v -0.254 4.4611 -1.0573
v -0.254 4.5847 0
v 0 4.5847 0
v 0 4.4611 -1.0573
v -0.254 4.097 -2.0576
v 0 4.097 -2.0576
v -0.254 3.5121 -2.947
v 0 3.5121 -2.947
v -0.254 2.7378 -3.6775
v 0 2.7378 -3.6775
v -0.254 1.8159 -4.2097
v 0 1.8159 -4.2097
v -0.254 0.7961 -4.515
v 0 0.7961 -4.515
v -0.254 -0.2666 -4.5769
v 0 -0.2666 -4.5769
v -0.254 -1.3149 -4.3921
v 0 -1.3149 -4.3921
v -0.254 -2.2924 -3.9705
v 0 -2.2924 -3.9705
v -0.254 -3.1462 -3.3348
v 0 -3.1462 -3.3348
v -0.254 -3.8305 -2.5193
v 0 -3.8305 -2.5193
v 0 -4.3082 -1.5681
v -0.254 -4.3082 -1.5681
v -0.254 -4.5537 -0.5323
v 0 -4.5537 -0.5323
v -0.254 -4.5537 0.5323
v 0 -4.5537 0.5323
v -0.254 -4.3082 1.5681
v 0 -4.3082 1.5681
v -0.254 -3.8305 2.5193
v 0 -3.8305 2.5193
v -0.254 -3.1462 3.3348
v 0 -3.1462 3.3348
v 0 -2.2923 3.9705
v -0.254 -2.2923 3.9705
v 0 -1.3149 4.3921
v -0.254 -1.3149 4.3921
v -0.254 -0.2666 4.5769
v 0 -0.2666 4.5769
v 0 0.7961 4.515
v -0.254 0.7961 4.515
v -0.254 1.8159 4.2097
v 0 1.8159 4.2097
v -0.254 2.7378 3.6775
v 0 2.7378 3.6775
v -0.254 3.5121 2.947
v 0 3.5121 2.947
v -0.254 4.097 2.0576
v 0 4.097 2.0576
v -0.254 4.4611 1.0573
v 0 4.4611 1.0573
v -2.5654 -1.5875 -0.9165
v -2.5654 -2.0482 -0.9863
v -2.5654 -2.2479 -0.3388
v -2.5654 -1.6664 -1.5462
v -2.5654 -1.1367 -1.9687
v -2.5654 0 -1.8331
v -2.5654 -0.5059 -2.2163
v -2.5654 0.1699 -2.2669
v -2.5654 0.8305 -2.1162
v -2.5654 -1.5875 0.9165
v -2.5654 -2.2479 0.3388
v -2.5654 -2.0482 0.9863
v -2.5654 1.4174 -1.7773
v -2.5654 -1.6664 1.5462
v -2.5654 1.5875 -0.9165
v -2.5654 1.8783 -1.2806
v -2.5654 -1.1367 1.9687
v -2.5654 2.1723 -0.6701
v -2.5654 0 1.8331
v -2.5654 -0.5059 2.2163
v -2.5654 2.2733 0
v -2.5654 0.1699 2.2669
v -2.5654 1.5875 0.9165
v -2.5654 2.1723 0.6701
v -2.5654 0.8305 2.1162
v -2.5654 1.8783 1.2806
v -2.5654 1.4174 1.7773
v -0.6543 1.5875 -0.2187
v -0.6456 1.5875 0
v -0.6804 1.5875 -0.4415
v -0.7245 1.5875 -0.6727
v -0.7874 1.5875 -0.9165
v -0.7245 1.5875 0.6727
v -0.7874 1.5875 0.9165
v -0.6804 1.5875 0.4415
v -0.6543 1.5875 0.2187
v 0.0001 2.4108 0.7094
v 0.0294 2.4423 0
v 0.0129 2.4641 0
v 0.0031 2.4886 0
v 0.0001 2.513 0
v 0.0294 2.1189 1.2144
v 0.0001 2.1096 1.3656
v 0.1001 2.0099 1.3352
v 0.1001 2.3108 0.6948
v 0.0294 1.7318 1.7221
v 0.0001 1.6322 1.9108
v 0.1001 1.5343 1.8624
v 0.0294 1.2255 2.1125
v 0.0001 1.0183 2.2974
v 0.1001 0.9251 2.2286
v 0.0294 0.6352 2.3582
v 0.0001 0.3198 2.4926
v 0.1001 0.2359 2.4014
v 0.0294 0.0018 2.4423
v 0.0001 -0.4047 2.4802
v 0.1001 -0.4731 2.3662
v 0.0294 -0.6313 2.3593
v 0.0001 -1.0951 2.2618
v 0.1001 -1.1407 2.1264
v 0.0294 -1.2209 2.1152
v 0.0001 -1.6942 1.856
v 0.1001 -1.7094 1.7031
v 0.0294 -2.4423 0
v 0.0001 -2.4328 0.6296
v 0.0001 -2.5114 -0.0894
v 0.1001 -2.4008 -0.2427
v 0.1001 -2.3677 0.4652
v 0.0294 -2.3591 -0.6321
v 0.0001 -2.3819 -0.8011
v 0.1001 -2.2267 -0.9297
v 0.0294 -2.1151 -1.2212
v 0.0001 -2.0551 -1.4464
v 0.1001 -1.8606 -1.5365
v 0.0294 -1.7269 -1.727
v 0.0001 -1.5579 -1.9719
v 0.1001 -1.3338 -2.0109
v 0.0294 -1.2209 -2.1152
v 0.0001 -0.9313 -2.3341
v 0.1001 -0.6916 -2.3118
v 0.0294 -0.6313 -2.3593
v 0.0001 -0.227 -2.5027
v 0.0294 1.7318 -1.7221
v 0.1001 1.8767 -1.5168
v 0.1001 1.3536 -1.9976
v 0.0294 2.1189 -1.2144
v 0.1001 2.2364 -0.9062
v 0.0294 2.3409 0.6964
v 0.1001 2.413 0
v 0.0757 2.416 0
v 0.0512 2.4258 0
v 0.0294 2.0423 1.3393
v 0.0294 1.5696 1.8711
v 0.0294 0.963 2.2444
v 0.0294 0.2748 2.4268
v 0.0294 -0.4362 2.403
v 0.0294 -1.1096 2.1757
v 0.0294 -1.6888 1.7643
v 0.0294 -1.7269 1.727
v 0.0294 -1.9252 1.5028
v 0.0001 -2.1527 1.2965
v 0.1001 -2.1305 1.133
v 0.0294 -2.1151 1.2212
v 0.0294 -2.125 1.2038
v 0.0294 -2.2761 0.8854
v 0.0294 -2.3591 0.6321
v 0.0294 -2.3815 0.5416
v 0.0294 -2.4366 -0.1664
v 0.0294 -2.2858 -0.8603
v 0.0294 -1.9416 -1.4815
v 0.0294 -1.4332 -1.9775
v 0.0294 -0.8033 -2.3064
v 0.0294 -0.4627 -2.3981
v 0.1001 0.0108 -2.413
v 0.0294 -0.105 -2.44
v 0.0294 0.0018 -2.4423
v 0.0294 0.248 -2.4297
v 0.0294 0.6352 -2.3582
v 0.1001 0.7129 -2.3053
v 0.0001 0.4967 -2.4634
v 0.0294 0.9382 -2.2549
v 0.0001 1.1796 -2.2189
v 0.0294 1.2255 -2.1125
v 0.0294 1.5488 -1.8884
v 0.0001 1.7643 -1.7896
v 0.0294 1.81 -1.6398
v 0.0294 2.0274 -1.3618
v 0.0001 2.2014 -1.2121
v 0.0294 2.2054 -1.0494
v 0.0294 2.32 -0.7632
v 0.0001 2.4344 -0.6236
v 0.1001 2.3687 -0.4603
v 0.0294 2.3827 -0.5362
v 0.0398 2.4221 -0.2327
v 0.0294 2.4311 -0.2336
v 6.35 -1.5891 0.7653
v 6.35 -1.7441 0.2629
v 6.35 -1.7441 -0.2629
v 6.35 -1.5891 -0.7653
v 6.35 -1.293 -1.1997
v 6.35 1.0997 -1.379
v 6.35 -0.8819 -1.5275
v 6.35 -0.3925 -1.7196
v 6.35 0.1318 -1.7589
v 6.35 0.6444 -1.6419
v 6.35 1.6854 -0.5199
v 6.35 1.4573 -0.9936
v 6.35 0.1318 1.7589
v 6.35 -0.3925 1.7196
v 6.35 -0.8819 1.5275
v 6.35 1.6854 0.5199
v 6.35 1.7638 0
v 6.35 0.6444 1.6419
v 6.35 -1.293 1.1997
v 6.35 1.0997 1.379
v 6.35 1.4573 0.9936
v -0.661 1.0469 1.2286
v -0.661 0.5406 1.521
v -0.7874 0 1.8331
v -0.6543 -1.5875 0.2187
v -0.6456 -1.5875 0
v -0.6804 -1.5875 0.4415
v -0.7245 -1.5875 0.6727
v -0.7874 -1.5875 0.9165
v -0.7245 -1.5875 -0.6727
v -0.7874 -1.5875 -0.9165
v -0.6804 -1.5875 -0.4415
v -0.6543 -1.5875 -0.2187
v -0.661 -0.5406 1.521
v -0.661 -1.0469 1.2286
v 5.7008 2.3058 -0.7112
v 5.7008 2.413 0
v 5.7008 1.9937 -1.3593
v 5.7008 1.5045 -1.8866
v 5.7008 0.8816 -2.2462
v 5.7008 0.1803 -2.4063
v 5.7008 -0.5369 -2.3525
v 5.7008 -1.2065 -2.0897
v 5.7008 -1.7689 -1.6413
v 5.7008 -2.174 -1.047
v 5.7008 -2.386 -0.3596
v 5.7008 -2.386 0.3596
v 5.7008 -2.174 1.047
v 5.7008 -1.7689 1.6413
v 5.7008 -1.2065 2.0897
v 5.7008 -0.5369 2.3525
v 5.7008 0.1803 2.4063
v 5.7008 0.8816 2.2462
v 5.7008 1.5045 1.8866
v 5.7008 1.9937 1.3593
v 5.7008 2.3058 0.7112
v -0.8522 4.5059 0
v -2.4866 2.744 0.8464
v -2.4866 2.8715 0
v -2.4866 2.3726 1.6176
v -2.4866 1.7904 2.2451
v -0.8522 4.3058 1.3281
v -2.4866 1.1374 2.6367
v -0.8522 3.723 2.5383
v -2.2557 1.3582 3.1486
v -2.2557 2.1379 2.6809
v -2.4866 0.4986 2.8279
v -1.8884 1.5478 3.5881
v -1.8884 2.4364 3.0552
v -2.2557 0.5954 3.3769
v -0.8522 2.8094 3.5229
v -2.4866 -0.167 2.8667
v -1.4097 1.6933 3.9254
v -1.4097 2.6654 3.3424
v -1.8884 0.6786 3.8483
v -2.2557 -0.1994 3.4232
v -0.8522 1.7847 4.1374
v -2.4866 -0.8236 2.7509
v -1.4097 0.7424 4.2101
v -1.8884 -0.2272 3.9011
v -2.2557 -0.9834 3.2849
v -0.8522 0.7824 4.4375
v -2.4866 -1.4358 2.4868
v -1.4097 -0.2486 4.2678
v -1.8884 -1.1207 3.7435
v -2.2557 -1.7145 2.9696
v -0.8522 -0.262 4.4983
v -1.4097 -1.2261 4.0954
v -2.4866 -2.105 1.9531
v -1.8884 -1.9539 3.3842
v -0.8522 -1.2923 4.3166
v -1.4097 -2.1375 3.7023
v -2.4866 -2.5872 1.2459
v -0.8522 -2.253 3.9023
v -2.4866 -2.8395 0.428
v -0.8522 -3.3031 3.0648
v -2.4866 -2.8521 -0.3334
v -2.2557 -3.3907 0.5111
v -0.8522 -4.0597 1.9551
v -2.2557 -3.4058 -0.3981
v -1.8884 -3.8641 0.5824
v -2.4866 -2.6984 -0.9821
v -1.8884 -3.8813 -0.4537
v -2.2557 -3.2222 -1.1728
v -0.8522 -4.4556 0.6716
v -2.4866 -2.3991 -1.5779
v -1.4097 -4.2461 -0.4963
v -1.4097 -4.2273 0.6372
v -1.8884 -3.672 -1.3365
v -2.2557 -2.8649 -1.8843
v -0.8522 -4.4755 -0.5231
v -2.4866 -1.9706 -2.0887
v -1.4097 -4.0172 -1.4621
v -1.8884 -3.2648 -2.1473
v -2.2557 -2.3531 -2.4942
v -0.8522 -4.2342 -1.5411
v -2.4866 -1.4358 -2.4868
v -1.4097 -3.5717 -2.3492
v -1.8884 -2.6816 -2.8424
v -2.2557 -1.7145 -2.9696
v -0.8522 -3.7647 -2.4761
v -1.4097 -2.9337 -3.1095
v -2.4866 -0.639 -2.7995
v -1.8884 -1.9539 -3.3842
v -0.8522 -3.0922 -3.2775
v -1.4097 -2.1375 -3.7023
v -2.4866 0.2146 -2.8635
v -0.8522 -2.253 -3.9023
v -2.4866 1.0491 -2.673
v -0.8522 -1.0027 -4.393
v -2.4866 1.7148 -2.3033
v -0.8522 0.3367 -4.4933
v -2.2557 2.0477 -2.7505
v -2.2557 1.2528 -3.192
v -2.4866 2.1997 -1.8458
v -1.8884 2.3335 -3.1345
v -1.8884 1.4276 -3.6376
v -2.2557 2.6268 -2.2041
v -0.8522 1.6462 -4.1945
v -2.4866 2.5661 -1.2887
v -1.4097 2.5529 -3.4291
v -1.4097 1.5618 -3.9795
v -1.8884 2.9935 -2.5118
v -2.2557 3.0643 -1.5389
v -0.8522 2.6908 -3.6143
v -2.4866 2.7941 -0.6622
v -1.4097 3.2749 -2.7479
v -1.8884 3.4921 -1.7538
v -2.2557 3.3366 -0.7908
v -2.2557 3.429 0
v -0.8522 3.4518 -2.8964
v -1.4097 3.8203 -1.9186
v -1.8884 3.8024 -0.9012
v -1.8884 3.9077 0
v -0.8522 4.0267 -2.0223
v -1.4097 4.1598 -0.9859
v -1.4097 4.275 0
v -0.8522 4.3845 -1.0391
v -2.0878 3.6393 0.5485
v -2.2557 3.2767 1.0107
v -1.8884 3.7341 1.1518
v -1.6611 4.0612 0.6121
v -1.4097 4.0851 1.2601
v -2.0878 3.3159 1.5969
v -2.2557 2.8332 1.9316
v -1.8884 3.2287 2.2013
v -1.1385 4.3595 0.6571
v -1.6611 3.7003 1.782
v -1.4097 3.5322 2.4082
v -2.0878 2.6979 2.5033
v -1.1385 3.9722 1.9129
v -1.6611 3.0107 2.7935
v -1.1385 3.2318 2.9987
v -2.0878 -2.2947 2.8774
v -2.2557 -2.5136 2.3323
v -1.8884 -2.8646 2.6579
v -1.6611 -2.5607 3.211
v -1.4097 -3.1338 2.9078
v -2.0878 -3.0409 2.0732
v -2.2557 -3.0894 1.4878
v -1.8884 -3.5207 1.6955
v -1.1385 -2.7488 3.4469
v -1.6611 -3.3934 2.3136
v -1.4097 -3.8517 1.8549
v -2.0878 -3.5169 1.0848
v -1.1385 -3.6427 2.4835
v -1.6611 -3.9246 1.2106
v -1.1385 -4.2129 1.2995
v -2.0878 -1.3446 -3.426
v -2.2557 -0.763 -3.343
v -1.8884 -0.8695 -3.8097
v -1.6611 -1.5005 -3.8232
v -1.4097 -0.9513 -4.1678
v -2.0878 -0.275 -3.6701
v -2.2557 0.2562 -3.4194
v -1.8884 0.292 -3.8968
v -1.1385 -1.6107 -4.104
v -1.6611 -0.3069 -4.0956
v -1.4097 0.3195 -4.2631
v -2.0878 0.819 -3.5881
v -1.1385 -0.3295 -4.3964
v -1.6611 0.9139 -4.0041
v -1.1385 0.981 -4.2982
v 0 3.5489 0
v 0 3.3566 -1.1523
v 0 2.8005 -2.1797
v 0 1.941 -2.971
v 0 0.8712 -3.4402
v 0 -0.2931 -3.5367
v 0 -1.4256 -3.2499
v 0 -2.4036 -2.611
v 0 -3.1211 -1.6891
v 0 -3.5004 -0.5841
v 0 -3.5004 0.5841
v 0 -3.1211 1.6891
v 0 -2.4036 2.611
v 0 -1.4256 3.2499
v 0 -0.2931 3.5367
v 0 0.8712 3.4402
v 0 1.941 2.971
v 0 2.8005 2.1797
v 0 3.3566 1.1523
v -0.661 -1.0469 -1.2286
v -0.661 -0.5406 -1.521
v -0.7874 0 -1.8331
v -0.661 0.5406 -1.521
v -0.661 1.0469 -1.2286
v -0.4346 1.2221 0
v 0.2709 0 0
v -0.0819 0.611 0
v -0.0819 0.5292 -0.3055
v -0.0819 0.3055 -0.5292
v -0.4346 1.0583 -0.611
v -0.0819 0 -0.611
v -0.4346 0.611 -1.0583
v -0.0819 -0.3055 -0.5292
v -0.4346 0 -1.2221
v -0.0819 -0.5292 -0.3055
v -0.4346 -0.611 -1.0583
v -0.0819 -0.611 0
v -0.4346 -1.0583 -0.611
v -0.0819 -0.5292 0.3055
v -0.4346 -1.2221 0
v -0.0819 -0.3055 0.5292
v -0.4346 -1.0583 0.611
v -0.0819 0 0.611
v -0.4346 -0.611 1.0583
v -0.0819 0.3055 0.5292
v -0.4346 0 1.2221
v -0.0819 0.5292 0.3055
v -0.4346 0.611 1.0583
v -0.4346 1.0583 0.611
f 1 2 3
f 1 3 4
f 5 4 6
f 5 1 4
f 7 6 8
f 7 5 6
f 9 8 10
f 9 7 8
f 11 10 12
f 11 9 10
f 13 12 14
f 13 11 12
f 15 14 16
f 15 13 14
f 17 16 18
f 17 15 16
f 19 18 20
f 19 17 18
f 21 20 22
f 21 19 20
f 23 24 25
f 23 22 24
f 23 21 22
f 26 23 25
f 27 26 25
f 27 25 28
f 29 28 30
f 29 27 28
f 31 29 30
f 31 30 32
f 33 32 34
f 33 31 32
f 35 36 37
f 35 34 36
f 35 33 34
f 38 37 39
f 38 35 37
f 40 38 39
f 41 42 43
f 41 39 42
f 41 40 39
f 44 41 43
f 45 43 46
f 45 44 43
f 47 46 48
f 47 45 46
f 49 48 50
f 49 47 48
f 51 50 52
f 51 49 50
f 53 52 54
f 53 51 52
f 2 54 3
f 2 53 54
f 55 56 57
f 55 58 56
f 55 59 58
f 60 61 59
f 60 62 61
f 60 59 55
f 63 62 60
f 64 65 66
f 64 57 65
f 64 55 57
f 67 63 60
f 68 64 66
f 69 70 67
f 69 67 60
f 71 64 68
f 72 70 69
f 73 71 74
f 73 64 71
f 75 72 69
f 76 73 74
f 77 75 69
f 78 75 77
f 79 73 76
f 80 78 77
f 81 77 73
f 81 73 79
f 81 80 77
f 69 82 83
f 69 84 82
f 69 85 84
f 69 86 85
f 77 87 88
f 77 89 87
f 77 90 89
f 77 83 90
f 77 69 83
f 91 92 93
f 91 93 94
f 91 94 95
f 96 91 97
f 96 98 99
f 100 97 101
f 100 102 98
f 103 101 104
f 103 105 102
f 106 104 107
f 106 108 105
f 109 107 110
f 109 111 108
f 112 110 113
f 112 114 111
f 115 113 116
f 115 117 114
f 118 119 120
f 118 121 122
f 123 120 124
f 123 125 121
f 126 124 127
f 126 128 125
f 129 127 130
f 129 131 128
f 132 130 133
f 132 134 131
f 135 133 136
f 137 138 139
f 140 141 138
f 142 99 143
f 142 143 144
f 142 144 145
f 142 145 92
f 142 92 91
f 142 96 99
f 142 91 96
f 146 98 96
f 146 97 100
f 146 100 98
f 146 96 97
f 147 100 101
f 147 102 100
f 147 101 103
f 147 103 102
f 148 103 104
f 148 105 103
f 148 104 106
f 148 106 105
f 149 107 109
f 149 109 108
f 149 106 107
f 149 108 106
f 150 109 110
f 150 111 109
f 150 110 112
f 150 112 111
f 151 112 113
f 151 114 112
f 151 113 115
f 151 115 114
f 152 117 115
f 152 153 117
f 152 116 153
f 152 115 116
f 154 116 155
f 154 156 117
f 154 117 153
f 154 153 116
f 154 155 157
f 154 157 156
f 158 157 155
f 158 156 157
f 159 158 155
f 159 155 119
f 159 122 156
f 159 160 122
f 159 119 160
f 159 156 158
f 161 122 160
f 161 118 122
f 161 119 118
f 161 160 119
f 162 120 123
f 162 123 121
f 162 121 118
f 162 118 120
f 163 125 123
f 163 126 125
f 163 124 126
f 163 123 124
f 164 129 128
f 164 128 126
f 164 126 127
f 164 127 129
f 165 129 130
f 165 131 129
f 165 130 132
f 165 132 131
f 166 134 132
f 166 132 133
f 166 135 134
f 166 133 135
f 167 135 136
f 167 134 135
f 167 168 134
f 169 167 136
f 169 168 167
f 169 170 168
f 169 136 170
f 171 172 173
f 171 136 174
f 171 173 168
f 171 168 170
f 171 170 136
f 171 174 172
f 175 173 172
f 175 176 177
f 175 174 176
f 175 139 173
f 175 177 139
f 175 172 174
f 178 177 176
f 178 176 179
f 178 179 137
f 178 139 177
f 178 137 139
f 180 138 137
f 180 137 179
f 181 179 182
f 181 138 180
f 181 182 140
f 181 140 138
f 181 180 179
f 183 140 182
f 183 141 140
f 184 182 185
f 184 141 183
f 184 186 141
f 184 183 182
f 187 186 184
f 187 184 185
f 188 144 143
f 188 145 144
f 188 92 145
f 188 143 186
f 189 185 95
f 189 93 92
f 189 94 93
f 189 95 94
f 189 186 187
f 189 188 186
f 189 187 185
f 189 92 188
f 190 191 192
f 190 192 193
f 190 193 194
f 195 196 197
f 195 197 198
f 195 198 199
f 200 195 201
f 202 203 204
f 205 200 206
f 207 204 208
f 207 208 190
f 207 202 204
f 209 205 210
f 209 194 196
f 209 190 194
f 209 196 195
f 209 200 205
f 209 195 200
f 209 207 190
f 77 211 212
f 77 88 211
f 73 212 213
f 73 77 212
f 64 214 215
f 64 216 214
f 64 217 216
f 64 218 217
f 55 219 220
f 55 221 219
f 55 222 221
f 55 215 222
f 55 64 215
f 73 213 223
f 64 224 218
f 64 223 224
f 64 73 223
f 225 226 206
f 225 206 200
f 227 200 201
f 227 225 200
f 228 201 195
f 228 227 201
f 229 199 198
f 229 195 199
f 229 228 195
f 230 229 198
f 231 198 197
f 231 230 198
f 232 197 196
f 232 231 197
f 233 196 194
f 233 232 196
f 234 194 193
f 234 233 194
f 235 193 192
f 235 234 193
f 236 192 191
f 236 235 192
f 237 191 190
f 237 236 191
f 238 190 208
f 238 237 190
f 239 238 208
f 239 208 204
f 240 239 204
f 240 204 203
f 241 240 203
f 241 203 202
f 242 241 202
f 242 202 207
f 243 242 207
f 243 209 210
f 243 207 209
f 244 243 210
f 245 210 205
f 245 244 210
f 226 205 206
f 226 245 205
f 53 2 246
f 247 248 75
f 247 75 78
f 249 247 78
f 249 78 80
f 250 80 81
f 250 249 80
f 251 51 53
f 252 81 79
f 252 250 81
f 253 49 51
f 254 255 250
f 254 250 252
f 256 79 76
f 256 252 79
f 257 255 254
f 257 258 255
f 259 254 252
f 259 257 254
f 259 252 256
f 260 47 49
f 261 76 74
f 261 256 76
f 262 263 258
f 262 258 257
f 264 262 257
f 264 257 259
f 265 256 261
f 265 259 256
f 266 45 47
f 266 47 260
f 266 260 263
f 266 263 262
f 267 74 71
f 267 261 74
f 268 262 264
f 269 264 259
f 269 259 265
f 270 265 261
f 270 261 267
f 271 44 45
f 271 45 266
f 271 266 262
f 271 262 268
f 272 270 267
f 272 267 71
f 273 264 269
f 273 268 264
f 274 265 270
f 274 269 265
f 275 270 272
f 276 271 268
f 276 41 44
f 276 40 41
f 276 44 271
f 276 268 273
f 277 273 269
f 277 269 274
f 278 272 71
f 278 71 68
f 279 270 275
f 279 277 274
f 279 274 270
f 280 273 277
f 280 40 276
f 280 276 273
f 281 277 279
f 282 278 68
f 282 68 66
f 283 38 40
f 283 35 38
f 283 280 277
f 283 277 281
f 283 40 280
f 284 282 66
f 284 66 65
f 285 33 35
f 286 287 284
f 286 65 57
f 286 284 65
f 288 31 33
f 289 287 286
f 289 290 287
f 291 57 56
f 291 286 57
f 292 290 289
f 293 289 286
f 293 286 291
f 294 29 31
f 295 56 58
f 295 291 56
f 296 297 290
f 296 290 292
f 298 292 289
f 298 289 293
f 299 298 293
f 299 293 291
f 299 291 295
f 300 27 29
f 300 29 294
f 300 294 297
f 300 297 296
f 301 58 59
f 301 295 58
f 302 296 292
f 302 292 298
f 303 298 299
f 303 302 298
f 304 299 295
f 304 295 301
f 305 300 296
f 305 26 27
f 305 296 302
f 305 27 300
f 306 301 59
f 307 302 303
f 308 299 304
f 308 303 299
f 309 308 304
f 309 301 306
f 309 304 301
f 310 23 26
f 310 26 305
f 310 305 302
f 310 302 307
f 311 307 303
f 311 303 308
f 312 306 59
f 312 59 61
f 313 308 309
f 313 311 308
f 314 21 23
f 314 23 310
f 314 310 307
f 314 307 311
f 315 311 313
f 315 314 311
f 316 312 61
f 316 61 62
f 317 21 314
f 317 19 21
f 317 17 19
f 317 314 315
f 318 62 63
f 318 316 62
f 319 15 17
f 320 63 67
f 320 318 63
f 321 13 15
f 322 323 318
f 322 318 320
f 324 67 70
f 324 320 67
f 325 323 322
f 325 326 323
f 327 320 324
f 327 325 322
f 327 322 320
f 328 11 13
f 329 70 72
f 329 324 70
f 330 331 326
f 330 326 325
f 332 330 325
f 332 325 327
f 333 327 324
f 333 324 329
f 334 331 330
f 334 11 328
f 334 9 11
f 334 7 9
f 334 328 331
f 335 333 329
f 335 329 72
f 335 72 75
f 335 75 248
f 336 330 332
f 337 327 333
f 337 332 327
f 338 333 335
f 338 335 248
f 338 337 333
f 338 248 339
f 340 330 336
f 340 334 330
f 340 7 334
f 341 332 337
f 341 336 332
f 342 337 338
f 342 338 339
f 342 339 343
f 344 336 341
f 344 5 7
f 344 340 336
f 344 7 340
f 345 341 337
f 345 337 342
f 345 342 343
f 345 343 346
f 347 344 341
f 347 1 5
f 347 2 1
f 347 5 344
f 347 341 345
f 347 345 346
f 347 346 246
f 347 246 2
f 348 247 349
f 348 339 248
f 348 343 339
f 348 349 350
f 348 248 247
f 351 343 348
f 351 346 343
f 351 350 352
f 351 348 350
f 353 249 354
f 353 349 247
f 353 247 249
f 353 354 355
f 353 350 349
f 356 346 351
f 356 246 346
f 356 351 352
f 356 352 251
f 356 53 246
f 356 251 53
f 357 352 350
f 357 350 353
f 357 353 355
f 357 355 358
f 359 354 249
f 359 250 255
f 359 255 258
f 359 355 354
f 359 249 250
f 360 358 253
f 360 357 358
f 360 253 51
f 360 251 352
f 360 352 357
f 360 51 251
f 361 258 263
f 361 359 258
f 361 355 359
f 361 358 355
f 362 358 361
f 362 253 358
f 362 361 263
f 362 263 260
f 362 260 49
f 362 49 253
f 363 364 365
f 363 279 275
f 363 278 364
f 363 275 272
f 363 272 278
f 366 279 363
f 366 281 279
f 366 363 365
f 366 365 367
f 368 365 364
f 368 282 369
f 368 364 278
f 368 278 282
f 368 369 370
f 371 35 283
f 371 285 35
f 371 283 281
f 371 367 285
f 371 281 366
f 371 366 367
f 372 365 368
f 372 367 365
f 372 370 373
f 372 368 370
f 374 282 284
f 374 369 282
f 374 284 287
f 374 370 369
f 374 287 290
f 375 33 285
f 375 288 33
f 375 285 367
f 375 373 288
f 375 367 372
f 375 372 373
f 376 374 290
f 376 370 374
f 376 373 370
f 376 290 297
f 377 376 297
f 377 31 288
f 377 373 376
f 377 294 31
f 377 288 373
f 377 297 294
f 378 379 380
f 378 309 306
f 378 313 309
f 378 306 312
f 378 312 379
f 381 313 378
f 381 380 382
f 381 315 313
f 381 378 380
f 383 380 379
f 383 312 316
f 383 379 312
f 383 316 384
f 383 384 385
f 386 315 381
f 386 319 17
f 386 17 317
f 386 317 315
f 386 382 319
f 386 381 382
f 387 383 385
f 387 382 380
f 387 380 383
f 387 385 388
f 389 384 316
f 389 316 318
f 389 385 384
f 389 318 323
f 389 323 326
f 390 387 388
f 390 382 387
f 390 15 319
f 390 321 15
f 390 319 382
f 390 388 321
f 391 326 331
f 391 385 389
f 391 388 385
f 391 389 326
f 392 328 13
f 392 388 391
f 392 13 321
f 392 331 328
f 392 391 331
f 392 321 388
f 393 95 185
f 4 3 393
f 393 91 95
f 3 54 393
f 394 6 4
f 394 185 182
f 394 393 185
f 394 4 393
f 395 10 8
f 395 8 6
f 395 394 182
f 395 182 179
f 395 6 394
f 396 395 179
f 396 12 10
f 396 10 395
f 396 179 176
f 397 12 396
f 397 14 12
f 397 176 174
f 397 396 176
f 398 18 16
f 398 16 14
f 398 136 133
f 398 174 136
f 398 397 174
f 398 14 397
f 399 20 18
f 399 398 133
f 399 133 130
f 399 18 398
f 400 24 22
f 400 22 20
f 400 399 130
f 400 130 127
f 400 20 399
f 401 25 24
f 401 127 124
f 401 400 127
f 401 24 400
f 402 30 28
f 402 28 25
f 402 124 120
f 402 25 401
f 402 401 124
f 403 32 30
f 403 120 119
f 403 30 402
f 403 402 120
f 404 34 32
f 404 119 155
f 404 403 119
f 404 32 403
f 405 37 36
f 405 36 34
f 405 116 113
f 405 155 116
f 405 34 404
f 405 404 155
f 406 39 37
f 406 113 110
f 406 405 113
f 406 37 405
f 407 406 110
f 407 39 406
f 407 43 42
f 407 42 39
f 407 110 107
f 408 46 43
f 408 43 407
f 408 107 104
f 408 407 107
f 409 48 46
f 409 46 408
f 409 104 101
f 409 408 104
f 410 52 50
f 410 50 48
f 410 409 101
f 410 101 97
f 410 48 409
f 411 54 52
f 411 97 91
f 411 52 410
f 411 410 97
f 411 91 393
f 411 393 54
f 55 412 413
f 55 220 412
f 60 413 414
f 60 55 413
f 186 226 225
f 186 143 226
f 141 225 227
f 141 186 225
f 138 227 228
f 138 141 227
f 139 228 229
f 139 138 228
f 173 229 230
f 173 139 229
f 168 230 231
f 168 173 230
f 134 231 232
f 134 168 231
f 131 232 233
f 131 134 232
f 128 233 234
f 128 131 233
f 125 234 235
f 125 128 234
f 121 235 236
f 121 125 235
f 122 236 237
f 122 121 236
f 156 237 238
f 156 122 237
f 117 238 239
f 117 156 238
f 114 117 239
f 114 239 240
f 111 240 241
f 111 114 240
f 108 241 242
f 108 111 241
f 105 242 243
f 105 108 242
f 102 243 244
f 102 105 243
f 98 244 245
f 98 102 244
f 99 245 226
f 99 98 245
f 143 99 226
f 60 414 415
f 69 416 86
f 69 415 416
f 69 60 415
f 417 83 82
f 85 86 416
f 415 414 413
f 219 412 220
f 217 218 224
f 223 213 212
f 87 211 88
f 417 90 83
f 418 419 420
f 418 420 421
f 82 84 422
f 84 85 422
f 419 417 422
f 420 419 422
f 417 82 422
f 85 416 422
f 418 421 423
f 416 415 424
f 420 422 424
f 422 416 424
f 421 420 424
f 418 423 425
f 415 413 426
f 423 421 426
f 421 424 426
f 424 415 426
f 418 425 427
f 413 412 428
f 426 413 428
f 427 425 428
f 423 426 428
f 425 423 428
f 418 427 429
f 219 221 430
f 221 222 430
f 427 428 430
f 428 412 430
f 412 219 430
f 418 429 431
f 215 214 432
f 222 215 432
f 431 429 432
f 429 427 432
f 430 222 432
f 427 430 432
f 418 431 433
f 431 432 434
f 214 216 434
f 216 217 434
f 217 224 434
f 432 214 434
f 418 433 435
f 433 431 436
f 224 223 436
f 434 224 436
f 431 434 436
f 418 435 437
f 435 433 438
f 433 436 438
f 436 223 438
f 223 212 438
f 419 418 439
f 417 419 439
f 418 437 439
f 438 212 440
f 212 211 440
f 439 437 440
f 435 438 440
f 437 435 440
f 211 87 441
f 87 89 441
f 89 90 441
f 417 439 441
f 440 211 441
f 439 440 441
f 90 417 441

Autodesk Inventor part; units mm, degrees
ref_plane "YZ Plane" through (0, 0, 0) normal (1, 0, 0) x (0, 1, 0)
ref_plane "XZ Plane" through (0, 0, 0) normal (0, 1, 0) x (-1, 0, 0)
sketch "Sketch1" plane through (0, 0, 0) normal (0, 0, 1) x (1, 0, 0)
  line L0 (0.2709, 0) -> (6.35, 0)
  line L1 (6.35, 0) -> (6.35, 2.413)
  line L2 (6.35, 2.413) -> (2.1084, 2.413)
  line L3 (2.1084, 2.413) -> (0.0001, 2.413)
  line L4 (0.0001, 2.413) -> (0, 2.413)
  line L5 (0, 2.413) -> (0, 4.5847)
  line L6 (0, 4.5847) -> (-2.5654, 4.5847)
  line L7 (-2.5654, 4.5847) -> (-2.5654, 1.8331)
  line L8 (-2.5654, 1.8331) -> (-0.7874, 1.8331)
  line L9 (-0.7874, 1.8331) -> (0.2709, 0)
  line L10 (-4.3485, 0) -> (8.1331, 0) projected
  line L11 (0, -0.9169) -> (0, 5.5016) projected
  line L12 (2.1084, 2.413) -> (0, 2.413) construction
  dimension "d1" = 4.2416
  dimension "d2" = 2.1083
  dimension "d3" = 2.5654
  dimension "d4" = 1.778
  dimension "d5" = 60
  dimension "d6" = 4.826
  dimension "d7" = 4.826
  dimension "d8" = 3.6662
  dimension "d9" = 9.1694
  dimension "d26" = 6.35
revolve "Body" add sketch "Sketch1" angle 360 about axis through (0.2709, 0, 0) along (1, 0, 0) contours L9 L11 L3 L2 L1 L0 | L9 L8 L7 L6 L5 L11
sketch "Sketch2" plane through (-2.5654, 0, 0) normal (-1, 0, 0) x (0, 0, 1)
  circle A0 centre (0, 0) radius 1.8331 projected
  line L0 (0, -6.4186) -> (0, 6.4186) projected
  line L1 (-6.4186, 0) -> (6.4186, 0) projected
  line L2 (1.8331, 0) -> (0.9165, -1.5875)
  line L3 (0.9165, -1.5875) -> (-0.9165, -1.5875)
  line L4 (-0.9165, -1.5875) -> (-1.8331, 0)
  line L5 (-1.8331, 0) -> (-0.9165, 1.5875)
  line L6 (-0.9165, 1.5875) -> (0.9165, 1.5875)
  line L7 (0.9165, 1.5875) -> (1.8331, 0)
  point P0 (0, 0)
extrude "Slot" add sketch "Sketch2" against normal up to next contours L7 A0 | A0 L2 | L6 L0 A0 | A0 L0 L3 | L0 L6 A0 | A0 L3 L0 | L4 A0 | A0 L5
fillet "Fillet1" radius 2.3114 1 edges at (-2.5654, -4.5847, 0)
thread "Thread" size "10-24 UNC" class "2A" standard "ANSI Unified Screw Threads" length 4.2416
chamfer "Chamfer1" distance 0.6492 distance2 0.6492 1 edges at (6.35, -2.413, 0) measured on face at (6.35, -0.2686, 0.7084)
ref_plane "Work Plane1" through (29, 0, 0) normal (0, -1, 0) x (1, 0, 0)
fillet "Fillet2" radius 0.1 1 edges at (0.0001, -2.413, 0)
equation "\"d30\" = R"
equation "\"d17\" = RR"
equation "\"d13\" = GEL"
equation "\"d15\" = -0.5 * SPD + 0.5 * GD"
equation "\"d16\" = GUL"
equation "\"d1\" = GEL"
equation "\"d3\" = KOH"
equation "\"d4\" = INTI"
equation "\"d6\" = GD"
equation "\"d7\" = BDM"
equation "\"d8\" = 1.1547 * SW"
equation "\"d9\" = KOD"
equation "\"d26\" = NLG"
equation "\"GD\" = NND"
equation "\"NLG\" = 6.35"
equation "\"GEL\" = 4.2416"
equation "\"KOD\" = 9.1694"
equation "\"KOH\" = 2.5654"
equation "\"INTI\" = 1.778"
equation "\"GAL\" = 2.1082"
equation "\"GUL\" = 0.64922"
equation "\"BDM\" = NND"
equation "\"SW\" = 3.175"
equation "\"RR\" = 2.3114"
equation "\"SPD\" = 3.52755"
equation "\"R\" = 0.1"
equation "\"TOA\" = 30deg"
equation "\"GD1\" = SPD"
equation "\"THREADDIA\" = 4.826"
equation "\"KOH1\" = 0.508"
equation "\"NND\" = 4.826"
equation "\"E0\" = 3.66725"
properties part number "ANSI B18.3 - 10 - 24 x 1/4, HSBHCSI" material "Steel, Mild"
